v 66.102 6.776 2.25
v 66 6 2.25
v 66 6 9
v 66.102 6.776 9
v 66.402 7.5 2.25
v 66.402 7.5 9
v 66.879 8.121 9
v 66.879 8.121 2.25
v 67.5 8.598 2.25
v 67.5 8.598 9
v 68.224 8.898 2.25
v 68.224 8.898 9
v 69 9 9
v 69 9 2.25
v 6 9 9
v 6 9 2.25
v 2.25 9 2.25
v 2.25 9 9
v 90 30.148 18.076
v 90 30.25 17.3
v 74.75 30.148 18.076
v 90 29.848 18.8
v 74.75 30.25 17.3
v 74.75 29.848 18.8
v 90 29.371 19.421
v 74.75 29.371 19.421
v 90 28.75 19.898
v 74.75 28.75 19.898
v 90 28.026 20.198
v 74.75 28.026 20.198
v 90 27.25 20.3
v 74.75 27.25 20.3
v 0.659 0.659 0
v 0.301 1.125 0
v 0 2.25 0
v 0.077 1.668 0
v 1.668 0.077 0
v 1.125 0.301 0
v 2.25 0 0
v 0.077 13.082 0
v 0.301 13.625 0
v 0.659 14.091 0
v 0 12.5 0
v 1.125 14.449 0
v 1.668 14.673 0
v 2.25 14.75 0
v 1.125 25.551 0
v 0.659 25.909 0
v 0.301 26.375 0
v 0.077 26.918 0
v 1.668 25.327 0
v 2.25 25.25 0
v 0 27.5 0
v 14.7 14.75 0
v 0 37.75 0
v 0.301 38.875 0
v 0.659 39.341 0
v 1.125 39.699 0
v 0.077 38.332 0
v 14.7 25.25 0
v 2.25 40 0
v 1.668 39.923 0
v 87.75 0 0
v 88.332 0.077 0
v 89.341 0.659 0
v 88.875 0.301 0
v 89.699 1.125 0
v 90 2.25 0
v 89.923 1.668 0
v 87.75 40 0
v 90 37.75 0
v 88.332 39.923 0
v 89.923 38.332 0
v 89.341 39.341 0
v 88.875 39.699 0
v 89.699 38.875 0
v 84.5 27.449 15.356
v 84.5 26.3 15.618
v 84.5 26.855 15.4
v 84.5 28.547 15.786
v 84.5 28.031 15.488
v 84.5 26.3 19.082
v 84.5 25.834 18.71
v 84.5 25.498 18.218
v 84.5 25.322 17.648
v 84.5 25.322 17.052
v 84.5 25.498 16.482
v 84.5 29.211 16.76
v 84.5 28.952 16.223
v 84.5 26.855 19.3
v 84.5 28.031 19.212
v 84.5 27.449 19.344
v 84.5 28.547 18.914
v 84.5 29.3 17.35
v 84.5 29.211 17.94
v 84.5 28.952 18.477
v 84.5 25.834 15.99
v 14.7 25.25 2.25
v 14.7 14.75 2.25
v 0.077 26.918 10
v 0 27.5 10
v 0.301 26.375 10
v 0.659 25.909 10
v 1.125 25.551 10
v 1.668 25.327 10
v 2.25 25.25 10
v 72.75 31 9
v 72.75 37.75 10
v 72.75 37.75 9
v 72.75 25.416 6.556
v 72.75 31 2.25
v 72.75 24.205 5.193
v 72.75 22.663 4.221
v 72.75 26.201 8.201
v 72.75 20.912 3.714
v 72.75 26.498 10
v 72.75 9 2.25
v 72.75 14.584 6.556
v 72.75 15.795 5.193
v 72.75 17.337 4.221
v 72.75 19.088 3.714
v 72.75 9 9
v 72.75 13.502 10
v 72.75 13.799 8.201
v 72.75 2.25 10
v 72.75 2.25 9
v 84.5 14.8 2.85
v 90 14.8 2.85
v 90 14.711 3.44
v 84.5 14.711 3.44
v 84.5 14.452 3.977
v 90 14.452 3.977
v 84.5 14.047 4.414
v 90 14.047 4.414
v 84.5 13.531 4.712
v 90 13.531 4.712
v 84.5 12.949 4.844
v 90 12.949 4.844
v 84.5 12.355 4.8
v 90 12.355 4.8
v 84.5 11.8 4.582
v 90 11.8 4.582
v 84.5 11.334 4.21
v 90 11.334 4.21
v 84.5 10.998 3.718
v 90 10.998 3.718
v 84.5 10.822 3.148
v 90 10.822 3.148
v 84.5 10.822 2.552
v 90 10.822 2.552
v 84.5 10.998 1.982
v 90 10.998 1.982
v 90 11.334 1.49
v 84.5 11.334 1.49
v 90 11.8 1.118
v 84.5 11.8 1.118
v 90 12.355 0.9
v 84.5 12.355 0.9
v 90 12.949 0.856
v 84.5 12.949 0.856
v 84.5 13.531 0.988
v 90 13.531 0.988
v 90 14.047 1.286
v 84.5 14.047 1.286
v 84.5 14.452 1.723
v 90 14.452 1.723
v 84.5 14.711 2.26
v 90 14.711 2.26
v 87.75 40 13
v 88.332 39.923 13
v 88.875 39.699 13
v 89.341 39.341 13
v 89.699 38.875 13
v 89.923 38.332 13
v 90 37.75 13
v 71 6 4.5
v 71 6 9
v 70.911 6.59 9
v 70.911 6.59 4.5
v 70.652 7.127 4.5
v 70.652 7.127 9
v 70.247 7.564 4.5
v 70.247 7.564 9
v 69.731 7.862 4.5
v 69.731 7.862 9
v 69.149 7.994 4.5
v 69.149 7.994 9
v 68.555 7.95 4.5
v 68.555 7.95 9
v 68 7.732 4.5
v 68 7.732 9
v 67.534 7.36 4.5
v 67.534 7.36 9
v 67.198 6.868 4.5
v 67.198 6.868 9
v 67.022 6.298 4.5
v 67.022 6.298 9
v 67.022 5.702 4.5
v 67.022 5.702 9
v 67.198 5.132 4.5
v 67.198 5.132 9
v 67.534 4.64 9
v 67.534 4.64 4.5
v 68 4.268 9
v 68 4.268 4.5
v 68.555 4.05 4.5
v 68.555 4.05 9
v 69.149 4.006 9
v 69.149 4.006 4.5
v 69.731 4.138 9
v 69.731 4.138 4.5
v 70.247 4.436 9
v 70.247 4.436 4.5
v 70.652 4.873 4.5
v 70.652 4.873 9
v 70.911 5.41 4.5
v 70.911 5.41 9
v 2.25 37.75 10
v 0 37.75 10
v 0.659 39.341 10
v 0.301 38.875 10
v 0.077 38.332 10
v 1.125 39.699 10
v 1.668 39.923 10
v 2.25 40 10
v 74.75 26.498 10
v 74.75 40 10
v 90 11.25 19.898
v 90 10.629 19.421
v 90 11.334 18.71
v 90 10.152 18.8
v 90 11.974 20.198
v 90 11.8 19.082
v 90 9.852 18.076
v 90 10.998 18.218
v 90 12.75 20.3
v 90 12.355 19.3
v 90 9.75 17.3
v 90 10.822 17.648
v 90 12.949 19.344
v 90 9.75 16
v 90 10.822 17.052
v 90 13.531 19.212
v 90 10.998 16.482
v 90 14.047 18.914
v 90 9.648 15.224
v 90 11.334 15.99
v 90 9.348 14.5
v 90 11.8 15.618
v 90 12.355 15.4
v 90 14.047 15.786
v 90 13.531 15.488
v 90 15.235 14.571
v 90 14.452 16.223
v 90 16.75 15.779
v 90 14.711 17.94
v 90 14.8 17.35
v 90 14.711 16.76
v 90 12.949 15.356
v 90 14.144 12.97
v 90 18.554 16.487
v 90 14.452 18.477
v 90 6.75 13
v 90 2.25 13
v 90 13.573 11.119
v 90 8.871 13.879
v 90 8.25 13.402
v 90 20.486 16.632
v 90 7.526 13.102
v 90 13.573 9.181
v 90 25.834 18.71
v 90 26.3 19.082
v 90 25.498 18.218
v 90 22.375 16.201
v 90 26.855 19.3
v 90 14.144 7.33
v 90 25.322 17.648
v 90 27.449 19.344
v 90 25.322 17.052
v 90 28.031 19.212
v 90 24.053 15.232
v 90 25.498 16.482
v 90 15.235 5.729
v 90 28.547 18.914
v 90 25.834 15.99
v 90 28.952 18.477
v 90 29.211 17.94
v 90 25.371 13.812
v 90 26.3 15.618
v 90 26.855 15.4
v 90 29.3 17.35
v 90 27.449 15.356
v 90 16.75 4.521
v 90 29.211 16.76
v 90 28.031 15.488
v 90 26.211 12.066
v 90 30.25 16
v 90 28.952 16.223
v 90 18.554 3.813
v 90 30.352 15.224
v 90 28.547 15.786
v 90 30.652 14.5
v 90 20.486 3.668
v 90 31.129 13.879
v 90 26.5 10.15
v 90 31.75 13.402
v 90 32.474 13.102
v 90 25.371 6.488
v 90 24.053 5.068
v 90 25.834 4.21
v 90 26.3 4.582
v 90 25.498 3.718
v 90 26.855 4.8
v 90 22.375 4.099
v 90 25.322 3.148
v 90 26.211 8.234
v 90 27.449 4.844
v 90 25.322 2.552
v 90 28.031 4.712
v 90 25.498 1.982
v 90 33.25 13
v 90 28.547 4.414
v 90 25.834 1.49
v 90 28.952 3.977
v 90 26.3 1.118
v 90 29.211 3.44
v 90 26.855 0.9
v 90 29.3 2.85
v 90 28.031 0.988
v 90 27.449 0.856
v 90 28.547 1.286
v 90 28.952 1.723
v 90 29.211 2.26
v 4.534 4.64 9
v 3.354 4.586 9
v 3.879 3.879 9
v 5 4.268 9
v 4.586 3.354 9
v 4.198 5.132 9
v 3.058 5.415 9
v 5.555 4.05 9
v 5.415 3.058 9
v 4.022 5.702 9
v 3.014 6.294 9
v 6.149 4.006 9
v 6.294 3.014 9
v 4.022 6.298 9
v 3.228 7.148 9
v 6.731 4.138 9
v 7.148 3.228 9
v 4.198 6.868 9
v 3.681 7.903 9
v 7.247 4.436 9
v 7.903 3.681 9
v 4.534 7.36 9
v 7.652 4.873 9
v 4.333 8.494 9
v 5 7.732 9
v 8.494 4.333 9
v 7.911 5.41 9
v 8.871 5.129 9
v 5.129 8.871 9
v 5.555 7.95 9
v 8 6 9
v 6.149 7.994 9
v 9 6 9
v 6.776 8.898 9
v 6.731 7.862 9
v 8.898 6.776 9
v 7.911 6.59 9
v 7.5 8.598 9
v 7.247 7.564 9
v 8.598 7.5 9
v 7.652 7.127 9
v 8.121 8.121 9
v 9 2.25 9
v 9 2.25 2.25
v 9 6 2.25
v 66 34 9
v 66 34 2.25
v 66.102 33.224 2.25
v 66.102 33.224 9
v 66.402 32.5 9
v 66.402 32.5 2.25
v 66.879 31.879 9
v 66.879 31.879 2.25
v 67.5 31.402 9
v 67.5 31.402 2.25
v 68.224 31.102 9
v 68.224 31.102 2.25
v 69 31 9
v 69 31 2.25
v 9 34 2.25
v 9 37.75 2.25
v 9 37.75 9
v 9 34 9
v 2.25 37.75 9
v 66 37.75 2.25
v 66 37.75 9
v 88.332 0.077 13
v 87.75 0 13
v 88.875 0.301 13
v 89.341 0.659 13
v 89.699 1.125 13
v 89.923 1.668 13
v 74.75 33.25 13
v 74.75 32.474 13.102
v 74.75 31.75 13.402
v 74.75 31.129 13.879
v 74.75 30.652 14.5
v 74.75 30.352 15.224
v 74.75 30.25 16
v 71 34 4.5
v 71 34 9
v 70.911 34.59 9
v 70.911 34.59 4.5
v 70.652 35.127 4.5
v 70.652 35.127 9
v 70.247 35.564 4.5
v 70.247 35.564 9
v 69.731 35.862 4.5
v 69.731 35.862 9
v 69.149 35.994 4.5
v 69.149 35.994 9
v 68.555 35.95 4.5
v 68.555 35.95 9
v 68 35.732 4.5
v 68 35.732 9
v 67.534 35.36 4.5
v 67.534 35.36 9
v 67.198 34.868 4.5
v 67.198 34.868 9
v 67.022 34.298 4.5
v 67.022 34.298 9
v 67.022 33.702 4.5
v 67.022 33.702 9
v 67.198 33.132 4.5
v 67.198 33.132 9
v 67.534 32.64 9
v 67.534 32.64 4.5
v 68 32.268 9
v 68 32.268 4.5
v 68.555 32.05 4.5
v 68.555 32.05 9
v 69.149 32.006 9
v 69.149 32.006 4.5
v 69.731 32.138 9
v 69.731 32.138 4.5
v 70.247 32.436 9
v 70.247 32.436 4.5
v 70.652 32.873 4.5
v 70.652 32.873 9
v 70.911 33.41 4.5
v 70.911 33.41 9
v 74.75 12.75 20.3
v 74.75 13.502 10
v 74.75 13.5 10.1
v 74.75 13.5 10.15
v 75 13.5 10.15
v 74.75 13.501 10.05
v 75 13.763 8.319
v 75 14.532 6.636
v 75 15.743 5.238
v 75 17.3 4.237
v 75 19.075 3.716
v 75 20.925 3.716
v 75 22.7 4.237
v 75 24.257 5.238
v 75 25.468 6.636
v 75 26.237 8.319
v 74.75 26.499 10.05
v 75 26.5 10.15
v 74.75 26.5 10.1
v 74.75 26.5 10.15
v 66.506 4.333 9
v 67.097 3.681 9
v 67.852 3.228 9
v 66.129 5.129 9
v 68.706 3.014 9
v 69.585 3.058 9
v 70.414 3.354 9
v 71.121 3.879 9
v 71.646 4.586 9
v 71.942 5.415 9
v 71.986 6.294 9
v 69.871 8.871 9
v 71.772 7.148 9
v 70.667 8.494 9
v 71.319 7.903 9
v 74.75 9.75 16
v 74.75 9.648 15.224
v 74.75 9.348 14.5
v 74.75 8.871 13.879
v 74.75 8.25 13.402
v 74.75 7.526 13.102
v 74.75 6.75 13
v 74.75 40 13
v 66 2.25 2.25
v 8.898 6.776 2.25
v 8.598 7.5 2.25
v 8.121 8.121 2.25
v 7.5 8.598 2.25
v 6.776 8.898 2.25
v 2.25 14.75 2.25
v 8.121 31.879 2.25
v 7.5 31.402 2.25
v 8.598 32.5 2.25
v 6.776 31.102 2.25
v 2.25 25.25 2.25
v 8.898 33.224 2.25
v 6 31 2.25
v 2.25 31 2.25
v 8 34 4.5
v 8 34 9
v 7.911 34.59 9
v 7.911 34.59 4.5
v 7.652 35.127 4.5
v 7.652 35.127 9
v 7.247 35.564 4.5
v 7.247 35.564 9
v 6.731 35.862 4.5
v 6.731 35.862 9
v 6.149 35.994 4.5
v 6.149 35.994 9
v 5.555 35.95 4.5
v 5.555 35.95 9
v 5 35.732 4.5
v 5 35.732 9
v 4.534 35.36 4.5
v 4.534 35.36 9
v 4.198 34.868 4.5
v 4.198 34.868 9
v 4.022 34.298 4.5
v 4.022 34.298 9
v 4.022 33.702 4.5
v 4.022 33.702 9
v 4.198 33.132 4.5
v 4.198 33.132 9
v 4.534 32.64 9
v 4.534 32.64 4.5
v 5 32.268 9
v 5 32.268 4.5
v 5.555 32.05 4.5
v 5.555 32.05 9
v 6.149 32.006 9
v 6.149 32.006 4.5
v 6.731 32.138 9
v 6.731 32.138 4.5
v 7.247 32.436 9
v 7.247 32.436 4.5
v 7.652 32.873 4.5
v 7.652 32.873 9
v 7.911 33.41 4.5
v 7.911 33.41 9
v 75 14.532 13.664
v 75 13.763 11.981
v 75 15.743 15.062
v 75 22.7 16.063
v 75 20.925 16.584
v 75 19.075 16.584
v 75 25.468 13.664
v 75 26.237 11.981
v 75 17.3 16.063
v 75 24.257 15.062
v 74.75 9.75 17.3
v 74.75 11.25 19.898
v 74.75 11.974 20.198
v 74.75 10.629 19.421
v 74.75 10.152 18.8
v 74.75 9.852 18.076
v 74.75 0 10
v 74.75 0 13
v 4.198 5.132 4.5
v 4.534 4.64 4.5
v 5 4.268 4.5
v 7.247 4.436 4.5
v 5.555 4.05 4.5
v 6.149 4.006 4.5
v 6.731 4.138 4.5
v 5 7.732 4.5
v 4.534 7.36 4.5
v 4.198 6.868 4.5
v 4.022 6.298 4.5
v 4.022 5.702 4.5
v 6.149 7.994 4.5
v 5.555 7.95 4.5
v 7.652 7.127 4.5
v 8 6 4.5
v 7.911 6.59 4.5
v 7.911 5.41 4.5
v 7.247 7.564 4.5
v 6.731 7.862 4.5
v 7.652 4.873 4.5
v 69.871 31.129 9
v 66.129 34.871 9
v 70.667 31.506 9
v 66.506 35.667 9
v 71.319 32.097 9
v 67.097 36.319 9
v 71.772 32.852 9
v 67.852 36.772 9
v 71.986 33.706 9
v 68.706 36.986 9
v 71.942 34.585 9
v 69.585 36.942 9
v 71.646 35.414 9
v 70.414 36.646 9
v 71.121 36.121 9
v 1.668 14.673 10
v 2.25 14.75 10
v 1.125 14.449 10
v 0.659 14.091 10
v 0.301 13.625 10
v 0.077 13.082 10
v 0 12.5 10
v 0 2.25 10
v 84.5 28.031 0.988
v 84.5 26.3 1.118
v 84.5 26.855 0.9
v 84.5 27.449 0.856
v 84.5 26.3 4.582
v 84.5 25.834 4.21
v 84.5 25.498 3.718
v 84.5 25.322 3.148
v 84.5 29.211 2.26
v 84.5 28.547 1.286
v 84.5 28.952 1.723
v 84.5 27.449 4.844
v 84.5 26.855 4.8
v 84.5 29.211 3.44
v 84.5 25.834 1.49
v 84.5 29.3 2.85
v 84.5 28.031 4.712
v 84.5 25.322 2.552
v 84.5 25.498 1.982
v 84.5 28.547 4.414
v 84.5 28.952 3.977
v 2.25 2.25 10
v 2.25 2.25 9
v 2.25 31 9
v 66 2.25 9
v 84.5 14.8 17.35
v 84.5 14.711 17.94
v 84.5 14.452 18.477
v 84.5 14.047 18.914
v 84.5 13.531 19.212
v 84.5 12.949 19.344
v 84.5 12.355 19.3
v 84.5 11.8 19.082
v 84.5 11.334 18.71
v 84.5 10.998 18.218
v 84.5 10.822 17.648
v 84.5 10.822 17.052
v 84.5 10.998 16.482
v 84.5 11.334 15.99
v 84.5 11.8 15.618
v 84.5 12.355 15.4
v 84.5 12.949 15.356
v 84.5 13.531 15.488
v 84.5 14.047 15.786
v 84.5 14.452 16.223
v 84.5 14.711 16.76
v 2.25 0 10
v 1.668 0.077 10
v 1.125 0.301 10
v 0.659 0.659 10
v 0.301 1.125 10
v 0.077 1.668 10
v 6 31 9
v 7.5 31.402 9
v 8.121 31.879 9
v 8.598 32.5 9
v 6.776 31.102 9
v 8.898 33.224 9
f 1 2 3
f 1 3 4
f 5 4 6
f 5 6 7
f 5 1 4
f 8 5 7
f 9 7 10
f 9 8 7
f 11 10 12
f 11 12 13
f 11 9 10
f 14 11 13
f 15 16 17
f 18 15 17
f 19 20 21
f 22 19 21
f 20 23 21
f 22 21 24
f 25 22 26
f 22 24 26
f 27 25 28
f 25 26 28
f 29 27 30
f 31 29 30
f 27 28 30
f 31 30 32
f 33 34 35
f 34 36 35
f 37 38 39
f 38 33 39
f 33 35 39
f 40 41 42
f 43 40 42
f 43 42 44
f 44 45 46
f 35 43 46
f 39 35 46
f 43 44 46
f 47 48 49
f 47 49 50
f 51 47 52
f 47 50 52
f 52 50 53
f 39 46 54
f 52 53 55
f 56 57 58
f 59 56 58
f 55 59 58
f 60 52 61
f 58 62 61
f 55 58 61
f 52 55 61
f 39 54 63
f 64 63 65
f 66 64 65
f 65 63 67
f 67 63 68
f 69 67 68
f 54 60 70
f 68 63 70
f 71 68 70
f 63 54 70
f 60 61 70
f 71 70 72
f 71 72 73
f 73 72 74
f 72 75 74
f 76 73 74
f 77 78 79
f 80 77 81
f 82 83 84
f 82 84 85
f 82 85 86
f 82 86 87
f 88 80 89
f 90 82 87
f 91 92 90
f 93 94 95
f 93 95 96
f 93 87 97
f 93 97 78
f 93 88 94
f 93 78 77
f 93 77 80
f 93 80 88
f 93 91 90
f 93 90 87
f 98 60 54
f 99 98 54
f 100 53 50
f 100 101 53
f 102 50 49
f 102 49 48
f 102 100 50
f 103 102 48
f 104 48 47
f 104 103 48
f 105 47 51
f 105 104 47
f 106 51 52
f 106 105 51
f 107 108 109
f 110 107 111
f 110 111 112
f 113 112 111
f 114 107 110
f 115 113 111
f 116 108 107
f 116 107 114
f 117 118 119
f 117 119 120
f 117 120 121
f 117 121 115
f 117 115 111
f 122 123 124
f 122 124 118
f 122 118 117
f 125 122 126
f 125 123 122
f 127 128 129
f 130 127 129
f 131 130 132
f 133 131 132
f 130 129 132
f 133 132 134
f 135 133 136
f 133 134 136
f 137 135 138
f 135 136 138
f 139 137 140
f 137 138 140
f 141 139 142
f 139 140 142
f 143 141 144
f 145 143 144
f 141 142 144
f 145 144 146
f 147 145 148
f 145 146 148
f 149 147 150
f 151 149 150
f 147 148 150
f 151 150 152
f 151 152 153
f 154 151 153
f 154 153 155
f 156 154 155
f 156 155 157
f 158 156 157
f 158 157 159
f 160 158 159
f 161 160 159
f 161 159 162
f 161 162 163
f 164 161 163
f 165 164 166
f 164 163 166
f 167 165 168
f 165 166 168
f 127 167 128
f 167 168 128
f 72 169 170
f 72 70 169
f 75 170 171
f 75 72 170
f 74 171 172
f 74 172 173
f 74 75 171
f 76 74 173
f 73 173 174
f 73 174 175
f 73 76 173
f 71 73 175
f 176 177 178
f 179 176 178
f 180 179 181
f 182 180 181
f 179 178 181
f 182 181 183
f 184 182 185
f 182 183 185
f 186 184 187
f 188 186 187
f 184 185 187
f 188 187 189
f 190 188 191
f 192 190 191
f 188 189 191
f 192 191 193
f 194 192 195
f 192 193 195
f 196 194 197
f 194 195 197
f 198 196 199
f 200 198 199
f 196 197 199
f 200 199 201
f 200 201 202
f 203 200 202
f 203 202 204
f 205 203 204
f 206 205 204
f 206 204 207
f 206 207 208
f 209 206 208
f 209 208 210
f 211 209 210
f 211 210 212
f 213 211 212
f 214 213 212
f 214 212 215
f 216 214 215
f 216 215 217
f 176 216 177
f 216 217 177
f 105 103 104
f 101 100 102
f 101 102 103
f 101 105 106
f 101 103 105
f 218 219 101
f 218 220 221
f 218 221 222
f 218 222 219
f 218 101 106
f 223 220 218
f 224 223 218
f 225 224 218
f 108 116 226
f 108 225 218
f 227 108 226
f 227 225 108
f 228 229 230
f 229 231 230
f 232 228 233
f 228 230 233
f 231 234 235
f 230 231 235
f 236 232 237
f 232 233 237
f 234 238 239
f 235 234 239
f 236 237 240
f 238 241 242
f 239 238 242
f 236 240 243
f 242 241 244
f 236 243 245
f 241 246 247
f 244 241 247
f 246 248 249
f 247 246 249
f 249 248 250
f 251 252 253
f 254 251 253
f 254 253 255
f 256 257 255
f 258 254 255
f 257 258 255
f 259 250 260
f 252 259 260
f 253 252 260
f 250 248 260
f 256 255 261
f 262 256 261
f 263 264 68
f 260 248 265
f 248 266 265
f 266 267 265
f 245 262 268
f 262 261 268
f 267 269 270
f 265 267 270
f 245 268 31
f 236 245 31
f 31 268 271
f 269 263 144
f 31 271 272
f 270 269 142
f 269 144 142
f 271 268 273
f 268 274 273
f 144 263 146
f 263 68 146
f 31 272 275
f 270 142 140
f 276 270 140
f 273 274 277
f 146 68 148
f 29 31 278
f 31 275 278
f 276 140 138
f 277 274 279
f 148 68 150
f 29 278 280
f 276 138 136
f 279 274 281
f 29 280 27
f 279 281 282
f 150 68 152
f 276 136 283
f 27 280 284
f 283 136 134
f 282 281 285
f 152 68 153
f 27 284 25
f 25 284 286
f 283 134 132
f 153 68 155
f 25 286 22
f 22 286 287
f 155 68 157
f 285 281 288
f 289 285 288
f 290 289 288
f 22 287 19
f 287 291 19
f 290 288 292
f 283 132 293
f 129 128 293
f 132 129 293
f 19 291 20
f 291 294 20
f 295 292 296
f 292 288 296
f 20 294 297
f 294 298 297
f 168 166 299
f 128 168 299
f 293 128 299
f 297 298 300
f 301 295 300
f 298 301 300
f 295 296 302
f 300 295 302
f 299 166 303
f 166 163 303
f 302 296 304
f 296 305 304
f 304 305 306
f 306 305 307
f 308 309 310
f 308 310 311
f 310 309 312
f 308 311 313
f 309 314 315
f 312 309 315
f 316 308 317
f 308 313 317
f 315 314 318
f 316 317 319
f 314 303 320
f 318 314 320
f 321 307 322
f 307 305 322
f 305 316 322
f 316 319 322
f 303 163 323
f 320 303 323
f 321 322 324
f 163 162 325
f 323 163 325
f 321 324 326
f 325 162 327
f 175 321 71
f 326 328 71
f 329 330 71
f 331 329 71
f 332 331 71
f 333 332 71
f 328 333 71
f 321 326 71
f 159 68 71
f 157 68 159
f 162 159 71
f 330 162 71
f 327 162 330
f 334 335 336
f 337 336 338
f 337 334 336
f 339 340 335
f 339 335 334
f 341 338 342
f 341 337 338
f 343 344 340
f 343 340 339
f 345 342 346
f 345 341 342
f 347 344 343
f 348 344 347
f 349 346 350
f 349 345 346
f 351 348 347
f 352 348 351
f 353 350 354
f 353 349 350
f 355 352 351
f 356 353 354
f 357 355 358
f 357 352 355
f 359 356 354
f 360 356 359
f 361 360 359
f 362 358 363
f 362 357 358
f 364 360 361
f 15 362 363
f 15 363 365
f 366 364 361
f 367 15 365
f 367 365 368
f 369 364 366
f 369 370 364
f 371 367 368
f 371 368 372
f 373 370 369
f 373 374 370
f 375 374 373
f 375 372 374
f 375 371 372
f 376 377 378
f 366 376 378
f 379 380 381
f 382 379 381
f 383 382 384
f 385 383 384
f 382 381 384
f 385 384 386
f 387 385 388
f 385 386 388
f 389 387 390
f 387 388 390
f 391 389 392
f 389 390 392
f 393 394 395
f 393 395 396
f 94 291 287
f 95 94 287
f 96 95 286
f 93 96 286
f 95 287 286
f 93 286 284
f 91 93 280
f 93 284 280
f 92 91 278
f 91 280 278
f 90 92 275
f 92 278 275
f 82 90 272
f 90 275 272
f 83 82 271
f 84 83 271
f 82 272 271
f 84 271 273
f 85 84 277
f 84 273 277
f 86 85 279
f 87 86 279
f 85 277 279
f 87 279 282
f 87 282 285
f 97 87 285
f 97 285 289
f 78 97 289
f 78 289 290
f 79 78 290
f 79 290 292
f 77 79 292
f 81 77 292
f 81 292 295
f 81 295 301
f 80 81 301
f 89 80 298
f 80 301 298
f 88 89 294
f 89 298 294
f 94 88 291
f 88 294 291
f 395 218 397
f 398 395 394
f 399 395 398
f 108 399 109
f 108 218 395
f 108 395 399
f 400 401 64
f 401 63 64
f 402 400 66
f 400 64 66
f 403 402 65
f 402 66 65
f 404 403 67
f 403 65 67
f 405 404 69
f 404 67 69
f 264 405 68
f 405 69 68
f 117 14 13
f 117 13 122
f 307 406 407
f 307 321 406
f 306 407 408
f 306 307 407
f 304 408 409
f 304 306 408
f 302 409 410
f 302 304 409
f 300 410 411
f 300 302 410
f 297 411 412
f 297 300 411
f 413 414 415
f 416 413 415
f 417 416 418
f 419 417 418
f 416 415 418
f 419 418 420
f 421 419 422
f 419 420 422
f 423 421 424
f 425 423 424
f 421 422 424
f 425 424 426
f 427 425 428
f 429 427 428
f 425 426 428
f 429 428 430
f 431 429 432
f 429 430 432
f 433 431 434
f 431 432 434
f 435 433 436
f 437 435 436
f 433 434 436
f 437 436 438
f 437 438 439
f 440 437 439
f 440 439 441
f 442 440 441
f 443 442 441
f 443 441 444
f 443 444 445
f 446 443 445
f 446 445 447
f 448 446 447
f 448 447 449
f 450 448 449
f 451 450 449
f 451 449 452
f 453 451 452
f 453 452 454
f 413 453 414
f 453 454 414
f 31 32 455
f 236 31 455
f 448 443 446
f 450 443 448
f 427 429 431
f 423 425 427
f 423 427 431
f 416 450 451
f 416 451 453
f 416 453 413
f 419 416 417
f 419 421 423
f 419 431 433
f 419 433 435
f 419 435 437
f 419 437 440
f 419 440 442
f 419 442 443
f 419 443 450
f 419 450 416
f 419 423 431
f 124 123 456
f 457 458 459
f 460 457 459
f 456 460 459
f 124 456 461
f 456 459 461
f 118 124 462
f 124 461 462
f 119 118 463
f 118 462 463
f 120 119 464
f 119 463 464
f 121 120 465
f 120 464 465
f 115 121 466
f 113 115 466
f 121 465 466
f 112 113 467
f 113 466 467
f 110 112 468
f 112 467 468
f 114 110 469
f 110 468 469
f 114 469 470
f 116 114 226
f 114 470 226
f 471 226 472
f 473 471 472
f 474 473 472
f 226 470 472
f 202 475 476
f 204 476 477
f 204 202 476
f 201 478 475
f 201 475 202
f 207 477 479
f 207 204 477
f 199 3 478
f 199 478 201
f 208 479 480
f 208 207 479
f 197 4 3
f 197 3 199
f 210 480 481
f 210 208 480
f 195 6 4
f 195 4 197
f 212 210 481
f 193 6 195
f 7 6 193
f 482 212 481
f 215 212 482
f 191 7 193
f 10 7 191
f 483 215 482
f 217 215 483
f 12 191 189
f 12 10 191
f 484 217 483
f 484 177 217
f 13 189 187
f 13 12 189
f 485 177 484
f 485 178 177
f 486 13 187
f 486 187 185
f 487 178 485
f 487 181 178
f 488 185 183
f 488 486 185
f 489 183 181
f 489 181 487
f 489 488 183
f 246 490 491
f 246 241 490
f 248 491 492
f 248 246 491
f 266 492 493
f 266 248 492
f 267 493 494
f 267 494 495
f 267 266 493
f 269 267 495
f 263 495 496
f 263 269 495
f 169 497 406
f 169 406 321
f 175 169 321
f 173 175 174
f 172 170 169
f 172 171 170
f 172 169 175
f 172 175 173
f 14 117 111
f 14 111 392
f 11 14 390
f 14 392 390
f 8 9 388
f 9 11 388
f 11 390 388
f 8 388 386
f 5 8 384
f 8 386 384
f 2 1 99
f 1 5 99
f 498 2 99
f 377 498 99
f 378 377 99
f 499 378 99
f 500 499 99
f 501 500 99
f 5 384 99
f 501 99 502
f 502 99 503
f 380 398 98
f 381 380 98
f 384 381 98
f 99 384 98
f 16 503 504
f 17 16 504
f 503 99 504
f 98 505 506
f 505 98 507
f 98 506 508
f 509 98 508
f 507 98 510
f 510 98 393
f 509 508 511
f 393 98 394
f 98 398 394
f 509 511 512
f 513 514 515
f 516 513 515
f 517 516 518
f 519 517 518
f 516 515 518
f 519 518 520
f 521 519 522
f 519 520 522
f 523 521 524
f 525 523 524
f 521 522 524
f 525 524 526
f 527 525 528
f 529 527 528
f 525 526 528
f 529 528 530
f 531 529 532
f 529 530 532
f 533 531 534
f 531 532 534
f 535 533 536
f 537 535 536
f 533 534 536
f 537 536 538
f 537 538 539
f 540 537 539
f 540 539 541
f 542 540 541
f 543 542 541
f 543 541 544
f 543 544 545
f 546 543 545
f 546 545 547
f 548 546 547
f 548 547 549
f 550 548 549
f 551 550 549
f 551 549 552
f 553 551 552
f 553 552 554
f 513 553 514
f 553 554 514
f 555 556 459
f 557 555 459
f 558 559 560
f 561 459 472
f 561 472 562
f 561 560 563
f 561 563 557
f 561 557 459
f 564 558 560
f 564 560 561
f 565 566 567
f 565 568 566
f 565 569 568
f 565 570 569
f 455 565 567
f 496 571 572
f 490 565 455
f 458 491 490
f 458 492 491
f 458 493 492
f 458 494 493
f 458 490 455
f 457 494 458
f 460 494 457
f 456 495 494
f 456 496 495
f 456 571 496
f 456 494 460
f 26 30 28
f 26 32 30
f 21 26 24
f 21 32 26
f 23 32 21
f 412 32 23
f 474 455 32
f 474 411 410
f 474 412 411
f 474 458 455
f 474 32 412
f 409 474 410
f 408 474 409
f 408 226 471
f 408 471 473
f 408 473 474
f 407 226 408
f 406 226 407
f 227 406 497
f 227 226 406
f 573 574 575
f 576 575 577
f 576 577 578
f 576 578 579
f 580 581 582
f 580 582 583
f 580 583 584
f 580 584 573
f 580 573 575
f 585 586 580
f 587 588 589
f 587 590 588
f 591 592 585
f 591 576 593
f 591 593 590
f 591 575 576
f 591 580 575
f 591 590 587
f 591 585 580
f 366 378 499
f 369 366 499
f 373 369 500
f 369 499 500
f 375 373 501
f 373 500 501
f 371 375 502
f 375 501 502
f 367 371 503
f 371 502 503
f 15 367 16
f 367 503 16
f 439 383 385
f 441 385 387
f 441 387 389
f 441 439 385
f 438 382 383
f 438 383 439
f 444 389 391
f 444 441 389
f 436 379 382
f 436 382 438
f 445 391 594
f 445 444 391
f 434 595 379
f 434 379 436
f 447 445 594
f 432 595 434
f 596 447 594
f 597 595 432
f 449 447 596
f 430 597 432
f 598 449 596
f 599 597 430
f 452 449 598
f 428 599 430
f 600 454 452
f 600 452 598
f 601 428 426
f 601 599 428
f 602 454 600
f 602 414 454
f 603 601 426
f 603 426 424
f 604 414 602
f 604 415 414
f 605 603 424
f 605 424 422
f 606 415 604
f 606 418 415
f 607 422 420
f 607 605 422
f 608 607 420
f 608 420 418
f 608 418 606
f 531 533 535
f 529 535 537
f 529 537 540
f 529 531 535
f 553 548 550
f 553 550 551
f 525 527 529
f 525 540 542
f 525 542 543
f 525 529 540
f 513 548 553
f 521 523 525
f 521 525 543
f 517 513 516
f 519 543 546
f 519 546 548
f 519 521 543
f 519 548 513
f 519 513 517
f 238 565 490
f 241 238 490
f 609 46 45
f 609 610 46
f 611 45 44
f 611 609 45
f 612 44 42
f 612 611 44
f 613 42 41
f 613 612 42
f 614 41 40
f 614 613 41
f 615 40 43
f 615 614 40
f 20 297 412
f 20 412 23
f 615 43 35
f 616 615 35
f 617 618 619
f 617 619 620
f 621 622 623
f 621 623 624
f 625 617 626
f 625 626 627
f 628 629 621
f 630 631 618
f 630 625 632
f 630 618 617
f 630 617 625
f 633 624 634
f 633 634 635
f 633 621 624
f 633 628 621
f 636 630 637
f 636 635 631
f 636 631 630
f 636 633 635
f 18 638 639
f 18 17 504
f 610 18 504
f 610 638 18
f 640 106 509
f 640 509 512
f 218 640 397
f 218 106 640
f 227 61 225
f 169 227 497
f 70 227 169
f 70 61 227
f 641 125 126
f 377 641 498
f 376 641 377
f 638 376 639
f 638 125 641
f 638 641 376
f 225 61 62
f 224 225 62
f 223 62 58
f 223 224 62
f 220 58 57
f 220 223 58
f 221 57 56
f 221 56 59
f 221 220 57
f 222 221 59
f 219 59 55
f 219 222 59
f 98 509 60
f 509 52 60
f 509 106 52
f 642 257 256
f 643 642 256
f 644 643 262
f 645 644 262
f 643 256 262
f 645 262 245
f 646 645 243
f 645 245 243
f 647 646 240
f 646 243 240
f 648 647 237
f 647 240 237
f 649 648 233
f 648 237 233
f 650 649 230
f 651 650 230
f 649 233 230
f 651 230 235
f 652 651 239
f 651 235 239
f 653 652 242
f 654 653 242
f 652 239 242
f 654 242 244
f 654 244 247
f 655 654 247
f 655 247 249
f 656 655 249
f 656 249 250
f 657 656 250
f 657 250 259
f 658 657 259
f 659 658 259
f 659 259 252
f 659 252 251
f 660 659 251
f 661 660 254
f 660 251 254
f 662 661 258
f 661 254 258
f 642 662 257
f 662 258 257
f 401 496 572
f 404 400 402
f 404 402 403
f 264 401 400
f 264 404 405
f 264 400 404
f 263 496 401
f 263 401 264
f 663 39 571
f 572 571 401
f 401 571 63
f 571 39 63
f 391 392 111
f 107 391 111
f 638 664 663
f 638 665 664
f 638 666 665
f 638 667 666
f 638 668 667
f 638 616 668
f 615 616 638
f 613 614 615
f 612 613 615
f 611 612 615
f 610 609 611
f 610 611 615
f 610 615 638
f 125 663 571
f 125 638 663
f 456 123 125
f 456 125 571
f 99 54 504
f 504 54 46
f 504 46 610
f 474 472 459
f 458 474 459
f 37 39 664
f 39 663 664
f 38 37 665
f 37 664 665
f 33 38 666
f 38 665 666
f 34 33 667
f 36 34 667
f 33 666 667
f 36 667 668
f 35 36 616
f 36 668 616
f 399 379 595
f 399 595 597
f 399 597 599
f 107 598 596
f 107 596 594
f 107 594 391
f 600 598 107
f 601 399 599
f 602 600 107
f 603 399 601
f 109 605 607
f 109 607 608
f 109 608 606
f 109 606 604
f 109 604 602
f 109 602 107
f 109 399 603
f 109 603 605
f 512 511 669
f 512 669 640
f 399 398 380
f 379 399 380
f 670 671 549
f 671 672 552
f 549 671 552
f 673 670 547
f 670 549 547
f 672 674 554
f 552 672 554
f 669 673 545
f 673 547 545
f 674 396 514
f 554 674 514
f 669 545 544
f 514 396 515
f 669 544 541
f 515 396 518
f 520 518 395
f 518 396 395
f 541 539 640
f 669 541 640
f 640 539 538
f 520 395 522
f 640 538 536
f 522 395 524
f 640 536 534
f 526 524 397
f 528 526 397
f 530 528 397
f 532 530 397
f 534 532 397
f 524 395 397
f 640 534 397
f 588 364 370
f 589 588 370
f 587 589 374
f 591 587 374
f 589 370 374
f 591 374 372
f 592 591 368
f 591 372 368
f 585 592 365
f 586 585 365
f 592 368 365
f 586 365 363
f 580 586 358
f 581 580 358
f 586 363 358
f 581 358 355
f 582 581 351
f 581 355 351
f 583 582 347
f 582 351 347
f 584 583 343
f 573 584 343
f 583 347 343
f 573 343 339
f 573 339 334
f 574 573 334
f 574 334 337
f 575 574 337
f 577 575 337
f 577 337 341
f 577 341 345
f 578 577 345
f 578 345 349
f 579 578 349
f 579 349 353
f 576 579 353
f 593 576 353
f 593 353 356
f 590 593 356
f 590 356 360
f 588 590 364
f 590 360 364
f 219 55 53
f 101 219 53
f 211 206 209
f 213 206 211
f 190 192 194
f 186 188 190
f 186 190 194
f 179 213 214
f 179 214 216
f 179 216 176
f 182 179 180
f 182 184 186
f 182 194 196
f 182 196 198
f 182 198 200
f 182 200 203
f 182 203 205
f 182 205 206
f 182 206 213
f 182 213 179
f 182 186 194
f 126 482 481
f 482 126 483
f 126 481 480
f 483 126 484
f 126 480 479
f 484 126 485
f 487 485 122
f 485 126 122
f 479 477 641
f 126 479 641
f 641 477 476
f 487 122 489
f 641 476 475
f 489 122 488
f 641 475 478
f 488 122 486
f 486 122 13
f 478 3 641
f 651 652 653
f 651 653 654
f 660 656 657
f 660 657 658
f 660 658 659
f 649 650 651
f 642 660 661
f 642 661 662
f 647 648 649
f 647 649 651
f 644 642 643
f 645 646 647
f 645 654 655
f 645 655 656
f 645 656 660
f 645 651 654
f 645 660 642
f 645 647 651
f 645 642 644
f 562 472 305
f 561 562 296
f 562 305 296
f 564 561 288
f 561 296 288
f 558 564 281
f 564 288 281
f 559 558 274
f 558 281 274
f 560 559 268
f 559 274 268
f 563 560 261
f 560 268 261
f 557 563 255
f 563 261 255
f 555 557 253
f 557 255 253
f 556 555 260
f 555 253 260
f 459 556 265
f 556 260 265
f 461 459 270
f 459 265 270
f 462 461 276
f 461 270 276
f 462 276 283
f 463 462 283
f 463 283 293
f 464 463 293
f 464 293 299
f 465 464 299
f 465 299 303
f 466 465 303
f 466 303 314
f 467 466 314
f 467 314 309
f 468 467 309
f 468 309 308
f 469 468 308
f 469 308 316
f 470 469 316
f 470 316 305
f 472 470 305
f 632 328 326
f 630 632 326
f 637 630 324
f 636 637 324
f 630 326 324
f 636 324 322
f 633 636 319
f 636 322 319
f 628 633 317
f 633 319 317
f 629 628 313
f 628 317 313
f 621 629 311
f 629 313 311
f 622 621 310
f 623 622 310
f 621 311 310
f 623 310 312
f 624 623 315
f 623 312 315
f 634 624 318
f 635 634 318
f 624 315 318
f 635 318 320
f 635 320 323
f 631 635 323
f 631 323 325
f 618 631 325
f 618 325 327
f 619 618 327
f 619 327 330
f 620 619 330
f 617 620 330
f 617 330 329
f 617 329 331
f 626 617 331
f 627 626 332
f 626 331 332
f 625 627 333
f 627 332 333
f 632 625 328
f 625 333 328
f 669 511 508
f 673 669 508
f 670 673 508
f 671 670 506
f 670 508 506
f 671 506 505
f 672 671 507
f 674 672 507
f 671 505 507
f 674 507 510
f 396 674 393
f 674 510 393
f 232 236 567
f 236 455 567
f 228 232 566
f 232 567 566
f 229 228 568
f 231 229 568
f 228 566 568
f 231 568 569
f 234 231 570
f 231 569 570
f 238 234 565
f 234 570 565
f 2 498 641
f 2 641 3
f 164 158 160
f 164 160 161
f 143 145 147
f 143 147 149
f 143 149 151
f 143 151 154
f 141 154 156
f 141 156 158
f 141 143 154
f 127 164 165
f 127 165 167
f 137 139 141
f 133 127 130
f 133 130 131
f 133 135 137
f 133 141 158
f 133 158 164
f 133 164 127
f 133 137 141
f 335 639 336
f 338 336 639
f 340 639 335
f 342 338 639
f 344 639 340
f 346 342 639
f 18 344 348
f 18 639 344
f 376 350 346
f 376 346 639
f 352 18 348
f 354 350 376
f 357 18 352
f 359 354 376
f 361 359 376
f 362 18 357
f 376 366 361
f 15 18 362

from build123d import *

# Parameters (mm, degrees)
BODY_DEPTH          = 10
PCB_RECESS_DEPTH    = 7.75
SKETCH11_R          = 3.000000000000004
SKETCH11_R_2        = 3.0000000000000084
SKETCH11_R_3        = 3.000000000000008
SKETCH11_R_4        = 2.999999999999999
PCB_BOSS_DEPTH      = 6.75
FILLET2_R           = 2.25
BOSS_EXTRUDE2_DEPTH = 15.25
SKETCH24_W          = 15.25
SKETCH24_H          = 9.74999999999999
SKETCH24_W_2        = 15.249999999999972
SKETCH24_H_2        = 9.750000000000002
BOSS_EXTRUDE3_DEPTH = 3
SKETCH25_R          = 6.5
CUT_EXTRUDE9_DEPTH  = 15
CUT_EXTRUDE10_DEPTH = 2.25
FILLET7_R           = 3
FILLET8_R           = 2.25
SKETCH27_R          = 2.0000000000000067
SKETCH27_R_2        = 2.000000000000003
SKETCH27_R_3        = 2
SKETCH27_R_4        = 1.9999999999999996
CUT_EXTRUDE11_DEPTH = 5.5
BOSS_EXTRUDE4_DEPTH = 6.75
SKETCH12_R          = 1.9999999999999991
SKETCH12_R_2        = 1.9999999999999967
SKETCH12_R_3        = 1.9999999999999996
CUT_EXTRUDE5_DEPTH  = 4.5


with BuildPart() as part:
    # Sketch4 → body (new body)
    with BuildSketch(Plane.XY):
        Polygon((0, 40), (1.73e-15, 25.25), (14.7, 25.25), (14.7, 14.750000000000002), (0, 14.75), (0, 0), (89.99999999999999, -6.94e-15), (90, 39.99999999999999), align=None)
    extrude(amount=BODY_DEPTH)

    # Sketch10 → pcb-recess (cut)
    with BuildSketch(Plane.XY.offset(10)):
        Polygon((72.75000000000001, 2.250000000000009), (2.2500000000000018, 2.2500000000000004), (2.2500000000000044, 37.74999999999999), (72.75, 37.75000000000001), align=None)
    extrude(amount=-PCB_RECESS_DEPTH, mode=Mode.SUBTRACT)

    # Sketch11 → pcb-boss (add)
    with BuildSketch(Plane.XY.offset(2.25)):
        with Locations((6.000000000000004, 34)):
            Circle(SKETCH11_R)
        with Locations((69, 34)):
            Circle(SKETCH11_R_2)
        with Locations((69, 6.000000000000005)):
            Circle(SKETCH11_R_3)
        with Locations((6.000000000000007, 6.000000000000005)):
            Circle(SKETCH11_R_4)
    extrude(amount=PCB_BOSS_DEPTH)

    # Fillet2
    fillet2_edges = [part.edges().sort_by_distance(p)[0] for p in [
        (0, 14.75, 5),
        (1.73e-15, 25.25, 5),
    ]]
    fillet(fillet2_edges, radius=FILLET2_R - 0.0001)  # a hair under: the kernel refuses the full size

    # Sketch23 → Boss-Extrude2 (add)
    with BuildSketch(Plane(origin=(89.99999999999999, -3.123e-14, 0), x_dir=(0, 0, -1), z_dir=(1, -3.5e-16, 0))):
        Polygon((-10, 30.250000000000025), (-20.299999999999997, 30.25000000000003), (-20.299999999999994, 9.750000000000027), (-9.999999999999998, 9.75000000000002), align=None)
    extrude(amount=-BOSS_EXTRUDE2_DEPTH)

    # Sketch24 → Boss-Extrude3 (add)
    with BuildSketch(Plane.XY.offset(10)):
        with Locations((82.375, 35.125)):
            Rectangle(SKETCH24_W, SKETCH24_H)
        with Locations((82.375, 4.874999999999994)):
            Rectangle(SKETCH24_W_2, SKETCH24_H_2)
    extrude(amount=BOSS_EXTRUDE3_DEPTH)

    # Sketch25 → Cut-Extrude9 (cut)
    with BuildSketch(Plane(origin=(89.99999999999999, -3.123e-14, 0), x_dir=(0, 0, -1), z_dir=(1, -3.5e-16, 0))):
        with Locations(Location((-10.149999999999999, 20.000000000000025, 0), (0, 0, 90))):
            Circle(SKETCH25_R)
    extrude(amount=-CUT_EXTRUDE9_DEPTH, mode=Mode.SUBTRACT)

    # Sketch26 → Cut-Extrude10 (cut)
    with BuildSketch(Plane(origin=(75, -2.602e-14, 0), x_dir=(0, 0, -1), z_dir=(1, -3.5e-16, 0))):
        with BuildLine():
            Line((-10.149999999999999, 26.500000000000025), (-10.149999999999999, 13.500000000000027))
            ThreePointArc((-10.149999999999999, 13.500000000000027), (-3.6499999999999986, 20.000000000000025), (-10.149999999999999, 26.500000000000025))
        make_face()
    extrude(amount=-CUT_EXTRUDE10_DEPTH, mode=Mode.SUBTRACT)

    # Fillet7
    fillet7_edges = [part.edges().sort_by_distance(p)[0] for p in [
        (82.375, 9.749999999999995, 13),
        (82.37499999999999, 9.749999999999996, 20.299999999999994),
        (82.375, 30.25, 20.299999999999997),
        (82.375, 30.25, 13),
    ]]
    fillet(fillet7_edges, radius=FILLET7_R)

    # Fillet8
    fillet8_edges = [part.edges().sort_by_distance(p)[0] for p in [
        (0, 40, 5),
        (90, 39.99999999999999, 6.5),
        (89.99999999999999, -6.94e-15, 6.5),
        (0, 0, 5),
    ]]
    fillet(fillet8_edges, radius=FILLET8_R)

    # Sketch27 → Cut-Extrude11 (cut)
    with BuildSketch(Plane(origin=(89.99999999999999, -3.123e-14, 0), x_dir=(0, 0, -1), z_dir=(1, -3.5e-16, 0))):
        with Locations(Location((-17.350000000000005, 27.300000000000026, 0), (0, 0, 90))):
            Circle(SKETCH27_R)
        with Locations(Location((-2.850000000000002, 27.300000000000026, 0), (0, 0, 90))):
            Circle(SKETCH27_R_2)
        with Locations(Location((-2.8499999999999948, 12.800000000000026, 0), (0, 0, 90))):
            Circle(SKETCH27_R_3)
        with Locations(Location((-17.349999999999998, 12.800000000000026, 0), (0, 0, 90))):
            Circle(SKETCH27_R_4)
    extrude(amount=-CUT_EXTRUDE11_DEPTH, mode=Mode.SUBTRACT)

    # Sketch28 → Boss-Extrude4 (add)
    with BuildSketch(Plane.XY.offset(2.25)):
        with BuildLine():
            Line((6.000000000000004, 31), (2.2500000000000036, 31))
            Line((2.2500000000000036, 31), (2.2500000000000044, 37.74999999999999))
            Line((2.2500000000000044, 37.74999999999999), (9.000000000000007, 37.74999999999999))
            Line((9.000000000000007, 37.74999999999999), (9.000000000000007, 34))
            ThreePointArc((9.000000000000007, 34), (8.121320343559649, 31.878679656440355), (6.000000000000004, 31))
        make_face()
        with BuildLine():
            Line((65.99999999999999, 37.75000000000001), (65.99999999999999, 34.000000000000014))
            ThreePointArc((65.99999999999999, 34.000000000000014), (66.87867965644034, 31.878679656440372), (68.99999999999999, 31.000000000000014))
            Line((68.99999999999999, 31.000000000000014), (72.75, 31.000000000000014))
            Line((72.75, 31.000000000000014), (72.75, 37.75000000000001))
            Line((72.75, 37.75000000000001), (65.99999999999999, 37.75000000000001))
        make_face()
        with BuildLine():
            Line((68.99999999999999, 8.999999999999988), (72.75, 8.999999999999988))
            Line((72.75, 8.999999999999988), (72.75, 2.249999999999995))
            Line((72.75, 2.249999999999995), (65.99999999999999, 2.249999999999995))
            Line((65.99999999999999, 2.249999999999995), (65.99999999999999, 5.999999999999985))
            ThreePointArc((65.99999999999999, 5.999999999999985), (66.87867965644034, 8.121320343559628), (68.99999999999999, 8.999999999999988))
        make_face()
        with BuildLine():
            Line((9.000000000000007, 2.250000000000009), (9.000000000000007, 5.999999999999998))
            ThreePointArc((9.000000000000007, 5.999999999999998), (8.121320343559649, 8.121320343559642), (6.000000000000004, 9.000000000000002))
            Line((6.000000000000004, 9.000000000000002), (2.2500000000000036, 9.000000000000002))
            Line((2.2500000000000036, 9.000000000000002), (2.2500000000000044, 2.250000000000009))
            Line((2.2500000000000044, 2.250000000000009), (9.000000000000007, 2.250000000000009))
        make_face()
    extrude(amount=BOSS_EXTRUDE4_DEPTH)

    # Sketch12 → Cut-Extrude5 (cut)
    with BuildSketch(Plane.XY.offset(9.000000000000002)):
        with Locations((6.000000000000004, 34)):
            Circle(SKETCH12_R)
        with Locations((69, 34)):
            Circle(SKETCH12_R_2)
        with Locations((69, 6.000000000000005)):
            Circle(SKETCH12_R_2)
        with Locations((6.000000000000007, 6.000000000000005)):
            Circle(SKETCH12_R_3)
    extrude(amount=-CUT_EXTRUDE5_DEPTH, mode=Mode.SUBTRACT)


solid = part.part
